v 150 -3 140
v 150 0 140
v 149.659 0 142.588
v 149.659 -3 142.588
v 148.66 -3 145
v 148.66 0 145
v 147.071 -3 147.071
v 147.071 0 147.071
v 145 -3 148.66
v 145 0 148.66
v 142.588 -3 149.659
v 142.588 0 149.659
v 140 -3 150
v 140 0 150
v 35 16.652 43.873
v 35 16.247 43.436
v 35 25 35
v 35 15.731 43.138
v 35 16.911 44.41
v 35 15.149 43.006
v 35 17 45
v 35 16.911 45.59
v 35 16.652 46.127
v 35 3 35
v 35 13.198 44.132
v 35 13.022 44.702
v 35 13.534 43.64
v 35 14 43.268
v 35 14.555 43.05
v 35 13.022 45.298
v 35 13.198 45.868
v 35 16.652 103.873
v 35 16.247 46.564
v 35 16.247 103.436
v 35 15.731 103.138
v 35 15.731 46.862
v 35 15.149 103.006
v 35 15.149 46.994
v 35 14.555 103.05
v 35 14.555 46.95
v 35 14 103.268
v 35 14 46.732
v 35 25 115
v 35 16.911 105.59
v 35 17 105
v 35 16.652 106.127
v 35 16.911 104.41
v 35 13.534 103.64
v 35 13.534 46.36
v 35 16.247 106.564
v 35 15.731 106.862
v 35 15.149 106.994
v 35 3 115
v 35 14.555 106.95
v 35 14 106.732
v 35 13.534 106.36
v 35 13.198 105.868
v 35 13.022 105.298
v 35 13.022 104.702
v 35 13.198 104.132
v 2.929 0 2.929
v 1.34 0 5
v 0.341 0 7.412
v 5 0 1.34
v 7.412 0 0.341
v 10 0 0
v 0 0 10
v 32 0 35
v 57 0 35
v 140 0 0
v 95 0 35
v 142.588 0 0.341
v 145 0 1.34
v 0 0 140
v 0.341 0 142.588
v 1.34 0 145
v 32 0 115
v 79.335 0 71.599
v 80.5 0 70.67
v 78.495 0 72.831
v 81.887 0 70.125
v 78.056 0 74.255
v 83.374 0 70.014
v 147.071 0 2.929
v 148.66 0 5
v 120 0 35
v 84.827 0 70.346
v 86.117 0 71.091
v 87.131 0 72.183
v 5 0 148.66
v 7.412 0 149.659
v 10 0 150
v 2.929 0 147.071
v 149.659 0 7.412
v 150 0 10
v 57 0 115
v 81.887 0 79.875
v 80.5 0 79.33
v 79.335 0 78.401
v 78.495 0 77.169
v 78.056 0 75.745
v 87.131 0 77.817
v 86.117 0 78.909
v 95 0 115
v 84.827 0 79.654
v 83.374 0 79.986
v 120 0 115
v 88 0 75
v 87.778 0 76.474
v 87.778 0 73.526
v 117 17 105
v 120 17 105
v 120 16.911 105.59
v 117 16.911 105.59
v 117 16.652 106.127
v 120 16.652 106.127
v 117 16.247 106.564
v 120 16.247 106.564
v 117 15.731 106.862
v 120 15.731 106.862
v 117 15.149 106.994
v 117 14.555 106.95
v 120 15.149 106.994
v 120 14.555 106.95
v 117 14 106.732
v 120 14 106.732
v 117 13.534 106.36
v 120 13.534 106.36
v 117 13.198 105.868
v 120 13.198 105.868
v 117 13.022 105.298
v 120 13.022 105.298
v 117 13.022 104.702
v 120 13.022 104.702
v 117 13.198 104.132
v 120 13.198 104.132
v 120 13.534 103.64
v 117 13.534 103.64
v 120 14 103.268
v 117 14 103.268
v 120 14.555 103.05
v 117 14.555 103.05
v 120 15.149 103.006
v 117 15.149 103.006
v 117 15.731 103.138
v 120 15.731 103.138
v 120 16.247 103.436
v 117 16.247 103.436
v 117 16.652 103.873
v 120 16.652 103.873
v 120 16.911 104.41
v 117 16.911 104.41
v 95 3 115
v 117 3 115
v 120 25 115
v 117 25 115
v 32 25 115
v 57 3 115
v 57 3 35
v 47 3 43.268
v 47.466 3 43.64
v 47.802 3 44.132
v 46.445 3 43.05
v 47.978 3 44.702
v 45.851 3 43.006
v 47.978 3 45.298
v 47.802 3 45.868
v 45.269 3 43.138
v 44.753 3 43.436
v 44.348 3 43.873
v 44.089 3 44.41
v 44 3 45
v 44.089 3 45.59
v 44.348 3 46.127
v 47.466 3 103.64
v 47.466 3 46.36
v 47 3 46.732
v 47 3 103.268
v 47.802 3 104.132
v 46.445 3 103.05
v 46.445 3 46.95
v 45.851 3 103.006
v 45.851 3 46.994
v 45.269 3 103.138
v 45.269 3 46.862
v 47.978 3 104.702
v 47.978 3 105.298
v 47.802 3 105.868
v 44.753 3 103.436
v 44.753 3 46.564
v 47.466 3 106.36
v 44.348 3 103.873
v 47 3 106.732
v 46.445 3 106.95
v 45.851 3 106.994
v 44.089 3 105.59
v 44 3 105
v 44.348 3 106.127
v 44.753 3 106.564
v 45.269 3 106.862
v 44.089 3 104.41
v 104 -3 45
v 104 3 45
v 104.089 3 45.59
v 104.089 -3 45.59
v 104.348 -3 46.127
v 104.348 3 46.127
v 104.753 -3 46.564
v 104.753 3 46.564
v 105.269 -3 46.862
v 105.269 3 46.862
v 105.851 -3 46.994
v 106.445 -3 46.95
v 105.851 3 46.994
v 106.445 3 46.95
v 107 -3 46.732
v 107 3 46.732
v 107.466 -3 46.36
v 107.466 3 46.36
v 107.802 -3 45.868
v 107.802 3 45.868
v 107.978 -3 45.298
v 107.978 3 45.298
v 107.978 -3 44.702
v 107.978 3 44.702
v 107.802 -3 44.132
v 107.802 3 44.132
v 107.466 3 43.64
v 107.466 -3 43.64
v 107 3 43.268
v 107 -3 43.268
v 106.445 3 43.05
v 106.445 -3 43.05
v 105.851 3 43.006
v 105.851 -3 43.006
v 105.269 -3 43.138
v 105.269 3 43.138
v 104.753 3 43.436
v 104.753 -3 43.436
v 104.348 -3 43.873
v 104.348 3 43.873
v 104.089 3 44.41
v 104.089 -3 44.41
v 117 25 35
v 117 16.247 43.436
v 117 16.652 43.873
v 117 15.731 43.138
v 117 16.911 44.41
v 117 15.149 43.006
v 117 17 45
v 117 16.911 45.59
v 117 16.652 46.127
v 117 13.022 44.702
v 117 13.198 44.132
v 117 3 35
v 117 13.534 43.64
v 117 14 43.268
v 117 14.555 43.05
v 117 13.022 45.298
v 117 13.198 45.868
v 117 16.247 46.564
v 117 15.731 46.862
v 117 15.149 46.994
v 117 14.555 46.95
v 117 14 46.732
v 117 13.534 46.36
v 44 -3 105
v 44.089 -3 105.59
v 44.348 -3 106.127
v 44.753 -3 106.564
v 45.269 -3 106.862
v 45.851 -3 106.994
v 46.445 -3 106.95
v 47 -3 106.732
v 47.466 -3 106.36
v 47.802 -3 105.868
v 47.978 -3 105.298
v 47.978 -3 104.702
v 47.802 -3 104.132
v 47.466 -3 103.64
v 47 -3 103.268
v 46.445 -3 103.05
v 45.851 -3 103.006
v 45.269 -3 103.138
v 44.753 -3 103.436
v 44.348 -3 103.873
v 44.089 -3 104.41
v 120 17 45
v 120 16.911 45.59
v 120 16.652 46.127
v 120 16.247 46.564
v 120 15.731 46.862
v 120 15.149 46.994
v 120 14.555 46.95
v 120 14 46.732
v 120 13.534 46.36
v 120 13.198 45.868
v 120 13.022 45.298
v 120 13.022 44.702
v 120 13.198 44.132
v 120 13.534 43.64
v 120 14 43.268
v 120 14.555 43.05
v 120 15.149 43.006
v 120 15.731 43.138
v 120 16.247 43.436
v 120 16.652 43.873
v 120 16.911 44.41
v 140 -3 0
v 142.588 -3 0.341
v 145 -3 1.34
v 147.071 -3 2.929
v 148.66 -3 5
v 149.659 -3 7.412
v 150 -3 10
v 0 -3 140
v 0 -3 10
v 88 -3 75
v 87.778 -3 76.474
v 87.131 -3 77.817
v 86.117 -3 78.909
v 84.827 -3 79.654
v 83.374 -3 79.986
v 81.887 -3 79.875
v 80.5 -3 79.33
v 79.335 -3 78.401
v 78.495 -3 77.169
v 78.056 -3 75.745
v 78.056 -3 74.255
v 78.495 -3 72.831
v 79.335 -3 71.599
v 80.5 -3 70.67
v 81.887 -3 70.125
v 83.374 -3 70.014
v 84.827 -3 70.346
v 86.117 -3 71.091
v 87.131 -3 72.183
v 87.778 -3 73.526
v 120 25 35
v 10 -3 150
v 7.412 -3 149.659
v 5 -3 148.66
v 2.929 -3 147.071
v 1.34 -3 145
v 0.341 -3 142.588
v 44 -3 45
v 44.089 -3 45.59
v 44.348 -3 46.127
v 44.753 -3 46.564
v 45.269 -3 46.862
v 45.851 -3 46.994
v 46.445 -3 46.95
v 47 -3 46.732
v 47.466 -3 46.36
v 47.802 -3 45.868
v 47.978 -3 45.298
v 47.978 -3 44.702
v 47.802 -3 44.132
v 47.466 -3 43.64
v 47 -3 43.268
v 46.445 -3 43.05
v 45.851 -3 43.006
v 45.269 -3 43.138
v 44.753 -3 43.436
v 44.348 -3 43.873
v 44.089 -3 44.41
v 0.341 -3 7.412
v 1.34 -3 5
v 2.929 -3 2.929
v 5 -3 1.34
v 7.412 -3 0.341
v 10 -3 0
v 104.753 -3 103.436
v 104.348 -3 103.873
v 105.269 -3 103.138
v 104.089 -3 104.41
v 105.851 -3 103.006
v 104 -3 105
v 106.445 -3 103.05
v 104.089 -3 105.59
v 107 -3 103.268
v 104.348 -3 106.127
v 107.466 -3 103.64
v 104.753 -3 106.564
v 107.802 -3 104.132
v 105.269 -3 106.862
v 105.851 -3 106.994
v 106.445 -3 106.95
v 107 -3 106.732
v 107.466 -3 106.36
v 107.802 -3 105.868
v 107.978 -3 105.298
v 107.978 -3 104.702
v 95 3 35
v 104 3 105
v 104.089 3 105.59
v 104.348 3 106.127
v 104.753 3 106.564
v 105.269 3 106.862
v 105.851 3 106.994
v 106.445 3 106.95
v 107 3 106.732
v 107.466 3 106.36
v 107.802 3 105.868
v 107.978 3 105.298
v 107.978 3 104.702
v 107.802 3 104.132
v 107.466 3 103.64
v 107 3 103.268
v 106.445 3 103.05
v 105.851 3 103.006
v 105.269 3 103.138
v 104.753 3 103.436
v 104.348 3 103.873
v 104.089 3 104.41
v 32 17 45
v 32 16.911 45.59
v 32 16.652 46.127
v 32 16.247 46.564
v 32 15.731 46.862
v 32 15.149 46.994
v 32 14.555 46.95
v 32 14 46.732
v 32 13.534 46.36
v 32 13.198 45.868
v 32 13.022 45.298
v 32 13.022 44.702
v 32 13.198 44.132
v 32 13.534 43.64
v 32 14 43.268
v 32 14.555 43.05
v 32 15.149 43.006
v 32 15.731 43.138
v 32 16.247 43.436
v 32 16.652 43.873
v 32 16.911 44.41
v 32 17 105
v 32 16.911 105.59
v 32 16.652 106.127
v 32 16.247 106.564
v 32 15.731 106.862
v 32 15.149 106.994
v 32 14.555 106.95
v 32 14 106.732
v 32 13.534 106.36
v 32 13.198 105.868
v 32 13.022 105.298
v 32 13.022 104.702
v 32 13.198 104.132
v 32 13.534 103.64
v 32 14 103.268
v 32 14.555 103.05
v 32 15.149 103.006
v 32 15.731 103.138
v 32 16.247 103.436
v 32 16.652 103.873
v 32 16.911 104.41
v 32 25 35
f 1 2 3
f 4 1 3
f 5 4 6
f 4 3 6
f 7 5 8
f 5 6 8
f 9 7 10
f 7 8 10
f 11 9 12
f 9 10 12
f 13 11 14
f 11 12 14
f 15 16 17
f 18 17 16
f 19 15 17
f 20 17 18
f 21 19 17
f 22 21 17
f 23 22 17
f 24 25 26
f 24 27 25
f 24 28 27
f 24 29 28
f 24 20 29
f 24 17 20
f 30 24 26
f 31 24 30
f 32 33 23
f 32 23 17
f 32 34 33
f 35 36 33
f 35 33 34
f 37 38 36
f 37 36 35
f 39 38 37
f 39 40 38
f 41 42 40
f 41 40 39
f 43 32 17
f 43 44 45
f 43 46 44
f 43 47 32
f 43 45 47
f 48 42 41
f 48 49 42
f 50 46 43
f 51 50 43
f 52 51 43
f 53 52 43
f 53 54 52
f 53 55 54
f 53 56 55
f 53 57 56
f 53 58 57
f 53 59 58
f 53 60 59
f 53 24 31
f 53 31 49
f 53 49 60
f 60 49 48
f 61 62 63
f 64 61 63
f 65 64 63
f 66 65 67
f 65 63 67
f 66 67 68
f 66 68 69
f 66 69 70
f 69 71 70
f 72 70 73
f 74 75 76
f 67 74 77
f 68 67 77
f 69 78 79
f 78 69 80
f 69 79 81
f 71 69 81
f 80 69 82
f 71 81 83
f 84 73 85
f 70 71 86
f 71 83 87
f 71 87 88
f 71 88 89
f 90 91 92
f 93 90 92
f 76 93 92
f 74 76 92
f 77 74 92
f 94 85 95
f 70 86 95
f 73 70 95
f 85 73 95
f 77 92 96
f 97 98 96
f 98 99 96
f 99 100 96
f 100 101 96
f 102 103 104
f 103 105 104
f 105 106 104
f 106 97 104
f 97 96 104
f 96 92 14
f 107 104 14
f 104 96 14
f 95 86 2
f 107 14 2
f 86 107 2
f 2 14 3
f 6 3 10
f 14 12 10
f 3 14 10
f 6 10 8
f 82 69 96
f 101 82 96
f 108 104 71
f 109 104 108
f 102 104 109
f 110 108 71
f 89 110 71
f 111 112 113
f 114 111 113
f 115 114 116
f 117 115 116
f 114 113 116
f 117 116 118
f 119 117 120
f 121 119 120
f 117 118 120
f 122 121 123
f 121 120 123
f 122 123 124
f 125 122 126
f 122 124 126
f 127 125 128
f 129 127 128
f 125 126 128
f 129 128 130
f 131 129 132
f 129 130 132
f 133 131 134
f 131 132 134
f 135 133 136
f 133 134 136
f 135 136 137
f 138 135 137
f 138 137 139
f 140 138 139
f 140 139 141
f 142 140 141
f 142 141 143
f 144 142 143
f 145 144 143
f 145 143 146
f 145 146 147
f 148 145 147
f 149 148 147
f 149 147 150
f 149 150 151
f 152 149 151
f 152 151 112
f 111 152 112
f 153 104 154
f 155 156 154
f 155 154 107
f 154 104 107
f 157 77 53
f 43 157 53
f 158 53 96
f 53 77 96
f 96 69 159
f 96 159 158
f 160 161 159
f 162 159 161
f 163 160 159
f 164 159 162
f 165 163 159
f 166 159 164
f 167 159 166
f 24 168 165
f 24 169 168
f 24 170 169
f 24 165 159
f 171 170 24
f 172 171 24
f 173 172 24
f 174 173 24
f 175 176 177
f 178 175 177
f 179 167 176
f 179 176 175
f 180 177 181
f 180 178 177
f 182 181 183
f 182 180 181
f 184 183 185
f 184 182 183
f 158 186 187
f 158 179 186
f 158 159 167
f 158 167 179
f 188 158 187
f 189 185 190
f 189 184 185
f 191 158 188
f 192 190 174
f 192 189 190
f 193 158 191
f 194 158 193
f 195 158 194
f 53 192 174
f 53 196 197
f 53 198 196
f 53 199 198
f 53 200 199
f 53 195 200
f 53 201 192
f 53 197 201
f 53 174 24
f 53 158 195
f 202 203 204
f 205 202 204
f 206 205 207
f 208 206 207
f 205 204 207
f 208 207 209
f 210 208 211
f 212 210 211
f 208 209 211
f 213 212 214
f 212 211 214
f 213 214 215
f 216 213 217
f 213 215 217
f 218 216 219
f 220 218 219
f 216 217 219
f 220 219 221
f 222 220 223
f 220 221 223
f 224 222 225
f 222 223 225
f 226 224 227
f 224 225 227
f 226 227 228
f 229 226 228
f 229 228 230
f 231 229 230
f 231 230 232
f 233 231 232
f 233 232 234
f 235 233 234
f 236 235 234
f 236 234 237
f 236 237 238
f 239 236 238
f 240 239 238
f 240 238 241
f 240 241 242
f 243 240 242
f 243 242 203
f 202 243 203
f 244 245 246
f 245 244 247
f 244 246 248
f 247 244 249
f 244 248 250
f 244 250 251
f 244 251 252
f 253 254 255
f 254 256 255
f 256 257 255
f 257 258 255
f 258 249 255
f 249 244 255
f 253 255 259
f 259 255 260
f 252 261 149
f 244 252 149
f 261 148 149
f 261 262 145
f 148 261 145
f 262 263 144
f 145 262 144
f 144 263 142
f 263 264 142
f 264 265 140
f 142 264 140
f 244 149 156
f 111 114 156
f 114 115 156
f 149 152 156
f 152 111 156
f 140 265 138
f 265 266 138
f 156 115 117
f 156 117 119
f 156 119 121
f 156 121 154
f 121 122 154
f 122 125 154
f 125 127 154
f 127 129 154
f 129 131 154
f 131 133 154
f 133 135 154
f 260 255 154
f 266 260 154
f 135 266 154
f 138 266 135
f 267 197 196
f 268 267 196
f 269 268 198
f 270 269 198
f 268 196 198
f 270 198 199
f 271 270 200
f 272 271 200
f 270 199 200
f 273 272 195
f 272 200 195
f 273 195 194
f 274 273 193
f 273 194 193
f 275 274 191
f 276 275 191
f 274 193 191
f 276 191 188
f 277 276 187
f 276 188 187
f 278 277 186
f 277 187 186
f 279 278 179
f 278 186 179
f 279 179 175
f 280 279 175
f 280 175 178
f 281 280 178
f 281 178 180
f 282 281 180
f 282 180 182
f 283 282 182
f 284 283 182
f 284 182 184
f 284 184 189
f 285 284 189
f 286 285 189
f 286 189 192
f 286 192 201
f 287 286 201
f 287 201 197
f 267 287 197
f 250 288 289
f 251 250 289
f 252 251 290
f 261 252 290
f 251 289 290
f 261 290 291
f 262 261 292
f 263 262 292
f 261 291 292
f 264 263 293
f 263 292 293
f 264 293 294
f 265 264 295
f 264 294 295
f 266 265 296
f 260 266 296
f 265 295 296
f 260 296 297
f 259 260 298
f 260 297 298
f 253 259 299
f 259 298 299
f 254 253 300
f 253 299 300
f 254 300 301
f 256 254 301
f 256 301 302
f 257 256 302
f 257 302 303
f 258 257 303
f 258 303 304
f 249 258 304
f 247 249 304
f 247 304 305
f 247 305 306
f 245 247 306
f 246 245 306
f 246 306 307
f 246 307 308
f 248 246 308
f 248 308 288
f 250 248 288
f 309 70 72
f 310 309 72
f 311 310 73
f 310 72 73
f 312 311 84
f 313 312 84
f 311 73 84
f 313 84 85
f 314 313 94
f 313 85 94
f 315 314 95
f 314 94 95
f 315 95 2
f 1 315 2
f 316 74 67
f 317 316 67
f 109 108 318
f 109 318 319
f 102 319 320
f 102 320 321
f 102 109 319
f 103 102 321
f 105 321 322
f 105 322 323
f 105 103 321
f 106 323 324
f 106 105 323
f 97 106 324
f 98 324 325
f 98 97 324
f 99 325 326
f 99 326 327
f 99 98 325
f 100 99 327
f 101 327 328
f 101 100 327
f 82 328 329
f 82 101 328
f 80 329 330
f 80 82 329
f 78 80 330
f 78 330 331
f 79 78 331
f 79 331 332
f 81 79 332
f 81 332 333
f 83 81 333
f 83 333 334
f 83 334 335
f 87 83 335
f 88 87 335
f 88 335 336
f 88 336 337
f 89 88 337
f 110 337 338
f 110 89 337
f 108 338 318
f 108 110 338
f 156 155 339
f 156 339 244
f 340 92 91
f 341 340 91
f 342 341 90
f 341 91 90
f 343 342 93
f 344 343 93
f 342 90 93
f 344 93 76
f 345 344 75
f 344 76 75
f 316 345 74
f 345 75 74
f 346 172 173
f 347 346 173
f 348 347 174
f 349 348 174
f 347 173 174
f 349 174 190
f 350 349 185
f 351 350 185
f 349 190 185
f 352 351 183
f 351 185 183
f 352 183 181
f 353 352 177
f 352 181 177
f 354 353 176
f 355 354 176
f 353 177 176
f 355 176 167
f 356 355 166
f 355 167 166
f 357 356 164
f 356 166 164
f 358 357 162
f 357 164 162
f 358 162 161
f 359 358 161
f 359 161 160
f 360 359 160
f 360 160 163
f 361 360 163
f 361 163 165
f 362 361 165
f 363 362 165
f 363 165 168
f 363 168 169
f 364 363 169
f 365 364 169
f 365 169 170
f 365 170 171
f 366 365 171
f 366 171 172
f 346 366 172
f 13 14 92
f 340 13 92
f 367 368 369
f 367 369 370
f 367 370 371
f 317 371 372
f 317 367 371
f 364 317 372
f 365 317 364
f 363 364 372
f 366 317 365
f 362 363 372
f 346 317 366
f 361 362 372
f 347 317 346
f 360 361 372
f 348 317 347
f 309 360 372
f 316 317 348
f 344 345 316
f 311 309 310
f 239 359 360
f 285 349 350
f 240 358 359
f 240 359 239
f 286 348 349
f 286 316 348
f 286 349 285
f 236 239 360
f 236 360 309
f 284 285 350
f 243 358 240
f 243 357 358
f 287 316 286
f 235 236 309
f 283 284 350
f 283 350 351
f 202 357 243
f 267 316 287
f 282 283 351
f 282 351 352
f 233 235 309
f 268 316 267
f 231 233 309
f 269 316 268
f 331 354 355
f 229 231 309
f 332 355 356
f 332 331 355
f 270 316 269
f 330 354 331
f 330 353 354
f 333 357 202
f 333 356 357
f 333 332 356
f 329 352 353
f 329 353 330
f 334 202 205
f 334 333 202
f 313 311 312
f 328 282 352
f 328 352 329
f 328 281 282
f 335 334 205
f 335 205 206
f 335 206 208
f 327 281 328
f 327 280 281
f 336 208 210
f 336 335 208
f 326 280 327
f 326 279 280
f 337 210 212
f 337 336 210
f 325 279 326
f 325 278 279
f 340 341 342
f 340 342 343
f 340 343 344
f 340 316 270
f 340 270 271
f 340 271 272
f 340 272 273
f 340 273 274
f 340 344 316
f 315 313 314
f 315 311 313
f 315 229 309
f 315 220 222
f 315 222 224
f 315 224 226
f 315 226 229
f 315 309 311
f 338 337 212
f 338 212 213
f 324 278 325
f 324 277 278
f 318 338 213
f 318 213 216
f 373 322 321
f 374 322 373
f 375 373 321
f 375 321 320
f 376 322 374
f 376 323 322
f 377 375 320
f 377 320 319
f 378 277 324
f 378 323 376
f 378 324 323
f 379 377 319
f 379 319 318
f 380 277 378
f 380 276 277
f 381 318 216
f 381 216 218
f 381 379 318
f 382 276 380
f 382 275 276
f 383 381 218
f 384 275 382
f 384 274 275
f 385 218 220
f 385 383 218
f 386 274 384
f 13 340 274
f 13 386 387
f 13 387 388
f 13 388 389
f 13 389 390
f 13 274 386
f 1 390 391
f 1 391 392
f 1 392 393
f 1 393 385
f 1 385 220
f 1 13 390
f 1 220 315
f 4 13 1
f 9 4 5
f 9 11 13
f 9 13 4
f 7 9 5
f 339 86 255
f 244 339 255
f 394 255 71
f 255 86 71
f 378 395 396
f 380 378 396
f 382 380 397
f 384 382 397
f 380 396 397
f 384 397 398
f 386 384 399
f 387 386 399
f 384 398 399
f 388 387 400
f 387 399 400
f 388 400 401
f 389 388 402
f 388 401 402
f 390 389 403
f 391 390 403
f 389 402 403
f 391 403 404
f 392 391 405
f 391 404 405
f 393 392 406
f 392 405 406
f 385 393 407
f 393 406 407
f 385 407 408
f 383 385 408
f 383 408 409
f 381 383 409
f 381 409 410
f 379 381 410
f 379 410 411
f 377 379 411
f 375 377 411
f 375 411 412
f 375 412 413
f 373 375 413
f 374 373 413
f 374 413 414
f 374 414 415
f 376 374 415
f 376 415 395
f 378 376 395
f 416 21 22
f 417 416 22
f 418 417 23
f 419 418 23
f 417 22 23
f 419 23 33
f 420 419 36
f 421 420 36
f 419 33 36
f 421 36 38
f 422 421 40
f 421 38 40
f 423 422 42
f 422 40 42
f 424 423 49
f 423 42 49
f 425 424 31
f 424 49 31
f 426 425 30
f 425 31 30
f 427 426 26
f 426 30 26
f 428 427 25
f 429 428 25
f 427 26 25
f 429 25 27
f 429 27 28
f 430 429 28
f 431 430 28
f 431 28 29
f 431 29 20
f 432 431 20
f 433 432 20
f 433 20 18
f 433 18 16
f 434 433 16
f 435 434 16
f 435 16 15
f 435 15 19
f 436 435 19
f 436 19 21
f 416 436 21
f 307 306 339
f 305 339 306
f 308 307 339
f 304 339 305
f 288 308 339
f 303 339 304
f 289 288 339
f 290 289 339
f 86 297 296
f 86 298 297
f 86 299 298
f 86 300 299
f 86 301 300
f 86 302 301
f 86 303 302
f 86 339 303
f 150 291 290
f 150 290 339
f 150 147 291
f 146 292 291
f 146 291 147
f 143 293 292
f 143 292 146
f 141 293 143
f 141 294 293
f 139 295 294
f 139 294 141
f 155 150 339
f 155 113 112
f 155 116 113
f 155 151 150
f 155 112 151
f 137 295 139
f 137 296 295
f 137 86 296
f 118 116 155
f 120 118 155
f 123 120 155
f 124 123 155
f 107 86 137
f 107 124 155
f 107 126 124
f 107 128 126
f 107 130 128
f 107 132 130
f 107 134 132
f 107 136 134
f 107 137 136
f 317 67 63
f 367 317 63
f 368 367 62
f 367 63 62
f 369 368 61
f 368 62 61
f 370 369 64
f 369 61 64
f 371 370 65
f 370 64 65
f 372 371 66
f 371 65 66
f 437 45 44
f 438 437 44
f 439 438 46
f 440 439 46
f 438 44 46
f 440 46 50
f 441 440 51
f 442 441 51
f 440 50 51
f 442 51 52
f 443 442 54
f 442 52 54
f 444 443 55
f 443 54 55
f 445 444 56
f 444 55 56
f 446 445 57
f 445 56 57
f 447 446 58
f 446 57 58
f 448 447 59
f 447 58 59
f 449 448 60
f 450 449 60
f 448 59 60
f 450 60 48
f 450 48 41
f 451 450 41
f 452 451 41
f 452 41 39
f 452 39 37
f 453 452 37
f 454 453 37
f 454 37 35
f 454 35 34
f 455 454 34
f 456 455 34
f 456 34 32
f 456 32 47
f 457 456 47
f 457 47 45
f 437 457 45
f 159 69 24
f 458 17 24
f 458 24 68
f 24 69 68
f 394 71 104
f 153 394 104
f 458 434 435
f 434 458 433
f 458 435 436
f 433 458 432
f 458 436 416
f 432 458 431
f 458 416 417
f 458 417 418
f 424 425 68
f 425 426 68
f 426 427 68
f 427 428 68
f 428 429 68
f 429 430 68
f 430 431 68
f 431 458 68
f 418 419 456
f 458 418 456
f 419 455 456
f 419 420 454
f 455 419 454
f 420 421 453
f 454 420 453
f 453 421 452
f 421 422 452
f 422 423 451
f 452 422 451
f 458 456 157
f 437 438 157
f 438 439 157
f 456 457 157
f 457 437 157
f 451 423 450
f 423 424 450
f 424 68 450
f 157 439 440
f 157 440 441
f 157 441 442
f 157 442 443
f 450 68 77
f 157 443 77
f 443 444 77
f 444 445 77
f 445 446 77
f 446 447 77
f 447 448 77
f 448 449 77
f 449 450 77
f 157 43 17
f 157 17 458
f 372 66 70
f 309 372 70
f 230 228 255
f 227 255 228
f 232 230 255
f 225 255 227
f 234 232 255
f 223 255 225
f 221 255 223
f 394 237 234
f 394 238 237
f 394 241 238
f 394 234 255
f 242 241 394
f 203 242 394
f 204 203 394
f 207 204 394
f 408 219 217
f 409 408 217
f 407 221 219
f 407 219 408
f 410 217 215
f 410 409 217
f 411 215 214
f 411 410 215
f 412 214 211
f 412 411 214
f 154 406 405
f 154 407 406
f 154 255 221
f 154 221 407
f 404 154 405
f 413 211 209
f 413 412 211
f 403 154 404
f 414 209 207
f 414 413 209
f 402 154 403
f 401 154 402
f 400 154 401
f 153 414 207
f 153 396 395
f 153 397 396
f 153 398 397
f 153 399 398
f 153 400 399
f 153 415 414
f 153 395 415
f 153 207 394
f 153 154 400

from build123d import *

# Parameters (mm, degrees)
F0_R     = 5
F1_DEPTH = 3
F2_W     = 3
F2_H     = 80
F3_DEPTH = 25
F2_W_2   = 22
F4_DEPTH = 3
F5_R     = 2
F6_DEPTH = 150
F7_R     = 2
F8_DEPTH = 25


with BuildPart() as f1:
    # F0 (on Front) → F1 (new body)
    with BuildSketch(Plane.XZ):
        with BuildLine():
            ThreePointArc((0, 10), (2.928932, 2.928932), (10, 0))
            Line((10, 0), (140, 0))
            ThreePointArc((140, 0), (147.071068, 2.928932), (150, 10))
            Line((150, 10), (150, 140))
            ThreePointArc((150, 140), (147.071068, 147.071068), (140, 150))
            Line((140, 150), (10, 150))
            ThreePointArc((10, 150), (2.928932, 147.071068), (0, 140))
            Line((0, 140), (0, 10))
        make_face()
        with Locations((83, 75)):
            Circle(F0_R, mode=Mode.SUBTRACT)
    extrude(amount=F1_DEPTH)

    # F2 (on face) → F3 (join)
    with BuildSketch(Plane(origin=(0, 0, 0), x_dir=(-1, 0, 0), z_dir=(0, 1, 0))):
        with Locations((-118.5, 75)):
            Rectangle(F2_W, F2_H)
        with Locations((-33.5, 75)):
            Rectangle(F2_W, F2_H)
    extrude(amount=F3_DEPTH)

    # F2 (on face) → F4 (join)
    with BuildSketch(Plane(origin=(0, 0, 0), x_dir=(-1, 0, 0), z_dir=(0, 1, 0))):
        with Locations((-106, 75)):
            Rectangle(F2_W_2, F2_H)
        with Locations((-118.5, 75)):
            Rectangle(F2_W, F2_H)
        with Locations((-46, 75)):
            Rectangle(F2_W_2, F2_H)
        with Locations((-33.5, 75)):
            Rectangle(F2_W, F2_H)
    extrude(amount=F4_DEPTH)

    # F5 (on face) → F6 (cut)
    with BuildSketch(Plane.YZ.offset(120)):
        with Locations((15, 105)):
            Circle(F5_R)
        with Locations((15, 45)):
            Circle(F5_R)
    extrude(amount=-F6_DEPTH, mode=Mode.SUBTRACT)

    # F7 (on face) → F8 (cut)
    with BuildSketch(Plane(origin=(0, 3, 0), x_dir=(-1, 0, 0), z_dir=(0, 1, 0))):
        with Locations((-46, 45)):
            Circle(F7_R)
        with Locations((-46, 105)):
            Circle(F7_R)
        with Locations((-106, 45)):
            Circle(F7_R)
        with Locations((-106, 105)):
            Circle(F7_R)
    extrude(amount=-F8_DEPTH, mode=Mode.SUBTRACT)


solid = f1.part
